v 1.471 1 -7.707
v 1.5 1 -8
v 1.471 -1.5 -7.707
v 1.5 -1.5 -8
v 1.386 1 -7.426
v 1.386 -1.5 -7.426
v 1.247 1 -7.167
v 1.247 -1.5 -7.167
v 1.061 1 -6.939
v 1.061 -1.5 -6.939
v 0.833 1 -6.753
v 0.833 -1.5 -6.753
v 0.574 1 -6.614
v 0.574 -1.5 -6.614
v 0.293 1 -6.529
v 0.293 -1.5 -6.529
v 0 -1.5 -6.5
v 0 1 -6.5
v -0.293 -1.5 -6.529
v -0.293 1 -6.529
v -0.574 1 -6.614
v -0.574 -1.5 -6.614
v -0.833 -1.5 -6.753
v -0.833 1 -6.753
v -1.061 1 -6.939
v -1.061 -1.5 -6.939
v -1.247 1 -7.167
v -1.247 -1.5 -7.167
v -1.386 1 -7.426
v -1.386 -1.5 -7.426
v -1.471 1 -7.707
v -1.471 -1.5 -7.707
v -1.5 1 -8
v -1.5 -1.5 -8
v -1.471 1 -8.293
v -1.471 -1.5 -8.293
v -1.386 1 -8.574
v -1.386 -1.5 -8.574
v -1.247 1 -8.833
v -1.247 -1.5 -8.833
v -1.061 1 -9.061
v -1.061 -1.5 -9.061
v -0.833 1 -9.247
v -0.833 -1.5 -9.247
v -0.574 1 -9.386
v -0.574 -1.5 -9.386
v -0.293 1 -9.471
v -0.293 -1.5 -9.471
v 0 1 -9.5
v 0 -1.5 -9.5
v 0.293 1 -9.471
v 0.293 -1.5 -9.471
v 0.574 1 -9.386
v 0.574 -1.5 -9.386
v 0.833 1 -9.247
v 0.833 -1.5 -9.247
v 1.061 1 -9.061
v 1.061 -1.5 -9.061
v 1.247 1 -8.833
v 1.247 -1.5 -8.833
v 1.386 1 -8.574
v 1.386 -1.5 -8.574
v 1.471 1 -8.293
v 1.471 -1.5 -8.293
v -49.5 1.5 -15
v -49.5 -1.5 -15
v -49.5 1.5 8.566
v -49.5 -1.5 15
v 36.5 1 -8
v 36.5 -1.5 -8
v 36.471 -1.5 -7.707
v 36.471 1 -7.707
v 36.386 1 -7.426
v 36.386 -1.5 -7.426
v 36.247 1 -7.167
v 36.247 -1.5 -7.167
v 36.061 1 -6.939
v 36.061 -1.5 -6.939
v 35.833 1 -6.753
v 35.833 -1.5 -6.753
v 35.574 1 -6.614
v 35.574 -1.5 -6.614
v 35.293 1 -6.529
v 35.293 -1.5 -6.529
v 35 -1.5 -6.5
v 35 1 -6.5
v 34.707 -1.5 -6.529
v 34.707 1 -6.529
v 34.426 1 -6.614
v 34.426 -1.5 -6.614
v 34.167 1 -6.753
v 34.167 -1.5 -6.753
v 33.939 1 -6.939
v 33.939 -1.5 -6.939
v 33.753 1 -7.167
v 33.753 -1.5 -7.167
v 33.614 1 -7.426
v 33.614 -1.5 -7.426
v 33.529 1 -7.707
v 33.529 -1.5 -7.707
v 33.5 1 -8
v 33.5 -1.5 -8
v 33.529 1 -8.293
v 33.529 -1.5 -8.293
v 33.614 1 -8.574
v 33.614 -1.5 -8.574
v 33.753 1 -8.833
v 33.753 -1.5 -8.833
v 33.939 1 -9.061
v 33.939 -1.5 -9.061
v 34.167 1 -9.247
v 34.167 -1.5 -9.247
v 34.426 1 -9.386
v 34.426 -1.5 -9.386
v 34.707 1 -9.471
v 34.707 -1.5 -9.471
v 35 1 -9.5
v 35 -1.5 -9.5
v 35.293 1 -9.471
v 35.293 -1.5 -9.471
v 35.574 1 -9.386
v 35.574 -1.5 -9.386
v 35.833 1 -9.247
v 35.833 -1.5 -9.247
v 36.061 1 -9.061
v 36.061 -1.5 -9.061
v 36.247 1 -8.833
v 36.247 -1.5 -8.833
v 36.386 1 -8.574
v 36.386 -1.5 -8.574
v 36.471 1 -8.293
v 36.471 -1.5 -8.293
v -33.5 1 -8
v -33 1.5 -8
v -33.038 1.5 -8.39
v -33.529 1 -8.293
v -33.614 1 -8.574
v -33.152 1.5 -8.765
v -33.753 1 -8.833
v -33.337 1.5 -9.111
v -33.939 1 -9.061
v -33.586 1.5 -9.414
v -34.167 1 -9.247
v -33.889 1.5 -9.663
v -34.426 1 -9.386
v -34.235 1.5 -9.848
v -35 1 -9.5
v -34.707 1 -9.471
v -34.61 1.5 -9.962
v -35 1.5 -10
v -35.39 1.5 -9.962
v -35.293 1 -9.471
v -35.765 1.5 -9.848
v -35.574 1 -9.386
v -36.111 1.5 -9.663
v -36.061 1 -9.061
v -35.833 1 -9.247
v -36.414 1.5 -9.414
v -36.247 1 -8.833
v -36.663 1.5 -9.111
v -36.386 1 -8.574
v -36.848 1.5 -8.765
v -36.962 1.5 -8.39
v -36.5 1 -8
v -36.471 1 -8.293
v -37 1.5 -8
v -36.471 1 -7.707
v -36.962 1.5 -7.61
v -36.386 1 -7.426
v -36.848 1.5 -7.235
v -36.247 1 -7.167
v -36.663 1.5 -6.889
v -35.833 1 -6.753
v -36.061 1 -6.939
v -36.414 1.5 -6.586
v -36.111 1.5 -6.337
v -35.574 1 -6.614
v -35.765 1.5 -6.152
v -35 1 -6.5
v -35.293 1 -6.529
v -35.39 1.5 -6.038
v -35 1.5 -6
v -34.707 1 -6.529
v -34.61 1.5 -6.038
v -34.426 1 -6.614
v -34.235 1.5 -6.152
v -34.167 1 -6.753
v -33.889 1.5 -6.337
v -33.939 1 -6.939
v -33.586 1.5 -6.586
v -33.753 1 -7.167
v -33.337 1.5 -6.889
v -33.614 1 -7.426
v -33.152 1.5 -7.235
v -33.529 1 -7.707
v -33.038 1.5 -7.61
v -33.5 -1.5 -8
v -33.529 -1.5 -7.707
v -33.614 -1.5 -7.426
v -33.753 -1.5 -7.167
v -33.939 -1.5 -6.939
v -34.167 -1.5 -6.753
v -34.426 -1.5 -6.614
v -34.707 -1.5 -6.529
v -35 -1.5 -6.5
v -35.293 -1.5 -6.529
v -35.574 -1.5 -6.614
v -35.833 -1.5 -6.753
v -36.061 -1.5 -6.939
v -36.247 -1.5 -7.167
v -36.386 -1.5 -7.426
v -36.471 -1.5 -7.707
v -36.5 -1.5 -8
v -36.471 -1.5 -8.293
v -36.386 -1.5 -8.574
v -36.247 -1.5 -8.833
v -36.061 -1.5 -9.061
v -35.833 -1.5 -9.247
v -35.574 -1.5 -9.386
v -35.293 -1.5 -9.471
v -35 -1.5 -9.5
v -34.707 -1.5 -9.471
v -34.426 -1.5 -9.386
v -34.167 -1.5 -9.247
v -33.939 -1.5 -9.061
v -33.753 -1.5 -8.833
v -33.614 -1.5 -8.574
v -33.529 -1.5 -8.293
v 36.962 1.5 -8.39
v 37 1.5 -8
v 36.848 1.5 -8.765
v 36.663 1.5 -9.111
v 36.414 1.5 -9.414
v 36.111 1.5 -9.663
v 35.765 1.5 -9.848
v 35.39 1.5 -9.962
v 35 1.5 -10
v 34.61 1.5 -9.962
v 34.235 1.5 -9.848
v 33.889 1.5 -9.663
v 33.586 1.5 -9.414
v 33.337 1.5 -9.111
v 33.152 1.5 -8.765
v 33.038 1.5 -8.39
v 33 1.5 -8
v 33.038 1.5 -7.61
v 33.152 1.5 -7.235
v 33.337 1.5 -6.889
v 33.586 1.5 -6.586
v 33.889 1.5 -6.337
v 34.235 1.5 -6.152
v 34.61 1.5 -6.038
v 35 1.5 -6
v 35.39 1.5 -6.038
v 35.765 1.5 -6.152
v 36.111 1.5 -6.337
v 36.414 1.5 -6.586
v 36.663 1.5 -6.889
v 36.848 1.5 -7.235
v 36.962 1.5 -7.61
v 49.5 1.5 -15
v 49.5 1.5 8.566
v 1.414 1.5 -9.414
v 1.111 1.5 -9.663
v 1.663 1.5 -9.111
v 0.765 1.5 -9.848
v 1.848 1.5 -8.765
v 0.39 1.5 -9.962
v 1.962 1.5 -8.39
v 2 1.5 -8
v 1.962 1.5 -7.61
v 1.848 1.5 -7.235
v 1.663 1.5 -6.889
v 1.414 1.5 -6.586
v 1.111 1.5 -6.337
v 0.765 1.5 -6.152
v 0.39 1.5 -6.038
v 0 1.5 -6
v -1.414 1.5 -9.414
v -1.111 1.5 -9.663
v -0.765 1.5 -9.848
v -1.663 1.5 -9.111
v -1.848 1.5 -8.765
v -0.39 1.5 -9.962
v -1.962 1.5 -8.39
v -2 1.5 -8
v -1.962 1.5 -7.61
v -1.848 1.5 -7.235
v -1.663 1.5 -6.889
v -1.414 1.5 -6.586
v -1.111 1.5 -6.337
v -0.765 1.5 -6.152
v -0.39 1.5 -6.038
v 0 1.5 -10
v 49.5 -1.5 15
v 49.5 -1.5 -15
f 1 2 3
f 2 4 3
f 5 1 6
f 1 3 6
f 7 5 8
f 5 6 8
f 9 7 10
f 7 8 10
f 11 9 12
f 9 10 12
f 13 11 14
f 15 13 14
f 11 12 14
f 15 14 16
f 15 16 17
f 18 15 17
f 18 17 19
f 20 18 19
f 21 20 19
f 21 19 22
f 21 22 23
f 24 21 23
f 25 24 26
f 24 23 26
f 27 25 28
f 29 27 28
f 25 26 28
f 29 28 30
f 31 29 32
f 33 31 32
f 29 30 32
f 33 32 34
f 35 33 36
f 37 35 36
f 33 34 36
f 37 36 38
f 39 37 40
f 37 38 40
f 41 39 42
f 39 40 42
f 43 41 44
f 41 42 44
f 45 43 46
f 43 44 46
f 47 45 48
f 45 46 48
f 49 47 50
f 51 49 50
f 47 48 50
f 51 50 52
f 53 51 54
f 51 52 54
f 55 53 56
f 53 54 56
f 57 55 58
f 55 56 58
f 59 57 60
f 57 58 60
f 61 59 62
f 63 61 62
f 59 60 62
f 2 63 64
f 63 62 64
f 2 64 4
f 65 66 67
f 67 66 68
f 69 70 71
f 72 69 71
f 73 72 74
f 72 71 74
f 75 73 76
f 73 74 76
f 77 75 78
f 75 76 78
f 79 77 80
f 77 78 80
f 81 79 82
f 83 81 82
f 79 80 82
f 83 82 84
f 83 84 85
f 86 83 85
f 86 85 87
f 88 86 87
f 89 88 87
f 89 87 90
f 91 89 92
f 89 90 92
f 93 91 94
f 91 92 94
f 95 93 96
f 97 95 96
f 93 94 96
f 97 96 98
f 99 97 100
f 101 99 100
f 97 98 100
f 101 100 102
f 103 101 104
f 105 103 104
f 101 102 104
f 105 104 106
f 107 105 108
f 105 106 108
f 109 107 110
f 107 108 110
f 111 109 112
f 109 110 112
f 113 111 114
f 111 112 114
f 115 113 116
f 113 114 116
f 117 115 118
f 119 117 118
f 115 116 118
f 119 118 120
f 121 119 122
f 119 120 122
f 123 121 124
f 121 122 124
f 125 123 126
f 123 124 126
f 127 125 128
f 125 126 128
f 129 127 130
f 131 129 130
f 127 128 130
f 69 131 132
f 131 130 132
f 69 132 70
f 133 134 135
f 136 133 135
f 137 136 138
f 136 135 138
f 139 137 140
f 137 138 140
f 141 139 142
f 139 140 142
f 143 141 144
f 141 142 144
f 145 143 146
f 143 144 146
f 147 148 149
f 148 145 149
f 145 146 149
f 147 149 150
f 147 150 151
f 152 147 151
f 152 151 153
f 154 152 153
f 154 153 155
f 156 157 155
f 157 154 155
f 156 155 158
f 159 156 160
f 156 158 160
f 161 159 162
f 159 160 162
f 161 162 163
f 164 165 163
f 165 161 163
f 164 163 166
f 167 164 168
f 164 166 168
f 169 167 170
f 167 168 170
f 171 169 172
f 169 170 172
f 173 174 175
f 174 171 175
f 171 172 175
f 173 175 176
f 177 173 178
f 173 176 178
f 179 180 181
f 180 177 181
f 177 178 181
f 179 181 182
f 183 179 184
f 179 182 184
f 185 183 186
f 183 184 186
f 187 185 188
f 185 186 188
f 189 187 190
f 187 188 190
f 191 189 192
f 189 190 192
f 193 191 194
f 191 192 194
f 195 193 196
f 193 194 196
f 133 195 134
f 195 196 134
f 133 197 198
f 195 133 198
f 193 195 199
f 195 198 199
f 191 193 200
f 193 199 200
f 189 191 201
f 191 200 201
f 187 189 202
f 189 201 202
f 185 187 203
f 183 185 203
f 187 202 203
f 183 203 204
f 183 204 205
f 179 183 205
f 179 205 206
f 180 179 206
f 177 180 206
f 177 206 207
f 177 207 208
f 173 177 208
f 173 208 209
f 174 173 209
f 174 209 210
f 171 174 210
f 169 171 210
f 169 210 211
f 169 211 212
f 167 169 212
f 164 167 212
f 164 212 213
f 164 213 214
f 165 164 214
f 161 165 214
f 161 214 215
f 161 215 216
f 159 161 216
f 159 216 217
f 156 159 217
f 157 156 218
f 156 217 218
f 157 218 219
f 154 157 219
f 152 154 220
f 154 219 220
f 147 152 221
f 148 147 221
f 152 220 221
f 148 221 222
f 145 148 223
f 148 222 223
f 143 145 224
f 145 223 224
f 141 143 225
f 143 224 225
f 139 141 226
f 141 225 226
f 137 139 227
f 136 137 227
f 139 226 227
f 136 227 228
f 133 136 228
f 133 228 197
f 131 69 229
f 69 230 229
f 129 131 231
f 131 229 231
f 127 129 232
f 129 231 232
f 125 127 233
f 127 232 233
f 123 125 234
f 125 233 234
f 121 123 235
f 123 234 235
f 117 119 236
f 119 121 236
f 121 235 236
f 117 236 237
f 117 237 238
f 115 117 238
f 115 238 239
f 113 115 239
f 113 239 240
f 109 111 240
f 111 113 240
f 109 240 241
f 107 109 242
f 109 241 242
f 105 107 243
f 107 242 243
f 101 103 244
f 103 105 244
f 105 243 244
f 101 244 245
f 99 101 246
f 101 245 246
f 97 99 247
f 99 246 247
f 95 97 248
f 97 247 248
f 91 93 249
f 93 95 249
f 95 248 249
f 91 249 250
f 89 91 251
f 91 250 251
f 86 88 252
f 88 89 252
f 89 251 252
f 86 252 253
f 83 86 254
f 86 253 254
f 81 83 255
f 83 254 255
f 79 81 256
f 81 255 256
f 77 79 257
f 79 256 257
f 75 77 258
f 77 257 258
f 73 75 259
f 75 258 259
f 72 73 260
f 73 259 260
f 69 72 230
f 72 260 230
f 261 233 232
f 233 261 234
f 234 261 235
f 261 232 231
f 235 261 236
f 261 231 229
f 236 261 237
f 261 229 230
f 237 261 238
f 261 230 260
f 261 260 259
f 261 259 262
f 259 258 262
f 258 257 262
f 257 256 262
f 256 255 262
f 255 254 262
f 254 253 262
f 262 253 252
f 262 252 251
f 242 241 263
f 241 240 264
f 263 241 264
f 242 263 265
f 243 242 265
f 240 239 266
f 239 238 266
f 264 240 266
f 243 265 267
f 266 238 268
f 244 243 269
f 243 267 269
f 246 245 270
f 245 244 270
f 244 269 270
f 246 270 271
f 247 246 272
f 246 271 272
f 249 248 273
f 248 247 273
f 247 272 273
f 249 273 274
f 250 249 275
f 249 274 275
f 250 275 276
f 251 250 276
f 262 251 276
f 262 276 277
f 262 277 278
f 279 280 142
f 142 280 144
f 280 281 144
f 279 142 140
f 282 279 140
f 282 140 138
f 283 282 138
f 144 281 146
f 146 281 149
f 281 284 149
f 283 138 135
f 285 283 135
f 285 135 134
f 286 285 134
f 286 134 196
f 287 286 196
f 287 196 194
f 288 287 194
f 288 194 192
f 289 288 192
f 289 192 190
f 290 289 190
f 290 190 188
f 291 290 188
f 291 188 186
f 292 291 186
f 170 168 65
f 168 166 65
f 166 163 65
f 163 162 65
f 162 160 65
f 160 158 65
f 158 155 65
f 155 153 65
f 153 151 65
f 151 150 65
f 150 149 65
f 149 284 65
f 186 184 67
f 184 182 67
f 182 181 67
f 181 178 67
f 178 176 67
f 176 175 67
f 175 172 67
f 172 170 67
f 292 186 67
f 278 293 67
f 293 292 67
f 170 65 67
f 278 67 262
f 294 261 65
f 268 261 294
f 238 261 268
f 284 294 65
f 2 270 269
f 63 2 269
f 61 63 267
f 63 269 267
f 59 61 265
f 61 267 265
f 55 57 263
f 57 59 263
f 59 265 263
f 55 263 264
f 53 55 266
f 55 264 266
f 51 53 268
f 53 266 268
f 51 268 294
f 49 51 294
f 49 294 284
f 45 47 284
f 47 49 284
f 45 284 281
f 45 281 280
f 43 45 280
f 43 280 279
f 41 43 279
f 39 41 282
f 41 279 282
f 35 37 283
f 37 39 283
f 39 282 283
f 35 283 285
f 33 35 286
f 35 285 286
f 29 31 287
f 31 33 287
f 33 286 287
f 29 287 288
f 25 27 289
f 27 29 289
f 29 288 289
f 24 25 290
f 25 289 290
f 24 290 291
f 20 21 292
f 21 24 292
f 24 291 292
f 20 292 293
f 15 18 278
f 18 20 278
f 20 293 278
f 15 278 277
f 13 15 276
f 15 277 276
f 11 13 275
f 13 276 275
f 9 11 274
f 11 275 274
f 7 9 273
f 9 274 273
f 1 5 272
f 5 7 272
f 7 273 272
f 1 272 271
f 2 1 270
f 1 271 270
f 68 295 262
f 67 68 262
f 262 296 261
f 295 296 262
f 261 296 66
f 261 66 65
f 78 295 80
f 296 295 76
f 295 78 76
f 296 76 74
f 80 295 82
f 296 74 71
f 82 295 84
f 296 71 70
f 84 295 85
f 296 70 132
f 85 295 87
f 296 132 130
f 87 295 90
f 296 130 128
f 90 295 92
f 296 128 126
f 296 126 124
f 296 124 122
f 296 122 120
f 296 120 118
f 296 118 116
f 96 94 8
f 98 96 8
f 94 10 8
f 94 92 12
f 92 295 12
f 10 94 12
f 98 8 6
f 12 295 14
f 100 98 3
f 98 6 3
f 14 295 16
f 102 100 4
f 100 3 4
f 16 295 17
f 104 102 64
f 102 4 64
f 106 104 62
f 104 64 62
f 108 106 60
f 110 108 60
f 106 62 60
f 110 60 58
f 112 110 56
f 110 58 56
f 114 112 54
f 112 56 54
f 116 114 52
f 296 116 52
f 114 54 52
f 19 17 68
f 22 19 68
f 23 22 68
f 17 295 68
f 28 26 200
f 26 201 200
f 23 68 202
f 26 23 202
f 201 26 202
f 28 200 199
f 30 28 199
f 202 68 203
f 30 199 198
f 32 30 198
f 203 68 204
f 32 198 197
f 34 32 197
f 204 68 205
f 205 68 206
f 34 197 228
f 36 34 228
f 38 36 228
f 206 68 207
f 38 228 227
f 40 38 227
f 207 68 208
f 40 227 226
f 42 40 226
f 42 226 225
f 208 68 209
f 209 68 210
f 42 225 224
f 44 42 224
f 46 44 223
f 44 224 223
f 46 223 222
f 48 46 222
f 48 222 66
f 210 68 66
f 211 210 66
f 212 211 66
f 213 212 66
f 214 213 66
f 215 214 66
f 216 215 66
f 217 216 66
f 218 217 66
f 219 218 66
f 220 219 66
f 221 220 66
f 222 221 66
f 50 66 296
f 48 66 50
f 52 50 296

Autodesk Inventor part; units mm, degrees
ref_plane "YZ Plane" through (0, 0, 0) normal (1, 0, 0) x (0, 1, 0)
ref_plane "XZ Plane" through (0, 0, 0) normal (0, 1, 0) x (-1, 0, 0)
ref_plane "XY Plane" through (0, 0, 0) normal (0, 0, 1) x (1, 0, 0)
sketch "Náčrt1" plane through (0, 0, 0) normal (1, 0, 0) x (0, 1, 0)
  line L0 (1.5, 15) -> (-1.5, 15)
  line L1 (-1.5, 15) -> (-1.5, -15)
  line L2 (-1.5, -15) -> (1.5, -15)
  line L3 (1.5, -15) -> (1.5, 15)
  line L4 (1.5, 15) -> (-1.5, -15) construction
  line L5 (-1.5, 15) -> (1.5, -15) construction
  line L6 (-1.5, 15) -> (1.5, 8.5665)
  point P0 (0, 0)
  dimension "d0" = 3
  dimension "d1" = 30
  dimension "d2" = 25
extrude "Vysunutí1" add sketch "Náčrt1" along normal mid plane 99 contours L6 L3 L2 L1
sketch "Náčrt2" plane through (-49.5, -1.5, -15) normal (0, -1, 0) x (1, 0, 0)
  circle A0 centre (84.5, 7) radius 1.5
  circle A1 centre (49.5, 7) radius 1.5
  circle A2 centre (14.5, 7) radius 1.5
  line L0 (0, 0) -> (99, 0) projected
  line L1 (99, 30) -> (99, 0) projected
  line L2 (0, 30) -> (99, 30) projected
  line L3 (0, 0) -> (0, 30) projected
  line L4 (99, 7) -> (0, 7) construction
  line L5 (49.5, 0) -> (49.5, 30) construction
  point P0 (49.5, 15)
  dimension "d5" = 7
  dimension "d6" = 3
  dimension "d7" = 35
  dimension "d8" = 3
extrude "Vysunutí2" cut sketch "Náčrt2" against normal through all contours A0 | A1 | A2
thread "Závit1" size "M3x0.5" class "6H" standard "ANSI Metric M Profile" full length
thread "Závit2" size "M3x0.5" class "6H" standard "ANSI Metric M Profile" full length
thread "Závit3" size "M3x0.5" class "6H" standard "ANSI Metric M Profile" full length
chamfer "Zkosení1" distance 0.5 angle 45 3 edges at (-36.5, 1.5, -8) (-1.5, 1.5, -8) (33.5, 1.5, -8)
sketch "Náčrt3" plane through (-49.5, -1.5, -15) normal (0, -1, 0) x (1, 0, 0)
  circle A0 centre (14.5, 7) radius 1.5 projected
  circle A1 centre (49.5, 7) radius 1.5 projected
  circle A2 centre (84.5, 7) radius 1.5 projected
  line L0 (0, 0) -> (99, 0) projected
  line L1 (99, 30) -> (99, 0) projected
  line L2 (0, 30) -> (99, 30) projected
  line L3 (0, 0) -> (0, 30) projected
  line L4 (98.5, 0.5) -> (53.2335, 0.5) construction
  line L5 (53.2335, 0.5) -> (53.2335, 9.4631) construction
  line L6 (53.2335, 9.4631) -> (98.5, 9.4631) construction
  line L7 (98.5, 9.4631) -> (98.5, 0.5) construction
  point P0 (49.5, 15)
  dimension "d0" = 3
  dimension "d1" = 30
  dimension "d2" = 25
  dimension "d22" = 0.5
  dimension "d23" = 0.5
properties part number "Knife" material "Ocel, uhlík"
